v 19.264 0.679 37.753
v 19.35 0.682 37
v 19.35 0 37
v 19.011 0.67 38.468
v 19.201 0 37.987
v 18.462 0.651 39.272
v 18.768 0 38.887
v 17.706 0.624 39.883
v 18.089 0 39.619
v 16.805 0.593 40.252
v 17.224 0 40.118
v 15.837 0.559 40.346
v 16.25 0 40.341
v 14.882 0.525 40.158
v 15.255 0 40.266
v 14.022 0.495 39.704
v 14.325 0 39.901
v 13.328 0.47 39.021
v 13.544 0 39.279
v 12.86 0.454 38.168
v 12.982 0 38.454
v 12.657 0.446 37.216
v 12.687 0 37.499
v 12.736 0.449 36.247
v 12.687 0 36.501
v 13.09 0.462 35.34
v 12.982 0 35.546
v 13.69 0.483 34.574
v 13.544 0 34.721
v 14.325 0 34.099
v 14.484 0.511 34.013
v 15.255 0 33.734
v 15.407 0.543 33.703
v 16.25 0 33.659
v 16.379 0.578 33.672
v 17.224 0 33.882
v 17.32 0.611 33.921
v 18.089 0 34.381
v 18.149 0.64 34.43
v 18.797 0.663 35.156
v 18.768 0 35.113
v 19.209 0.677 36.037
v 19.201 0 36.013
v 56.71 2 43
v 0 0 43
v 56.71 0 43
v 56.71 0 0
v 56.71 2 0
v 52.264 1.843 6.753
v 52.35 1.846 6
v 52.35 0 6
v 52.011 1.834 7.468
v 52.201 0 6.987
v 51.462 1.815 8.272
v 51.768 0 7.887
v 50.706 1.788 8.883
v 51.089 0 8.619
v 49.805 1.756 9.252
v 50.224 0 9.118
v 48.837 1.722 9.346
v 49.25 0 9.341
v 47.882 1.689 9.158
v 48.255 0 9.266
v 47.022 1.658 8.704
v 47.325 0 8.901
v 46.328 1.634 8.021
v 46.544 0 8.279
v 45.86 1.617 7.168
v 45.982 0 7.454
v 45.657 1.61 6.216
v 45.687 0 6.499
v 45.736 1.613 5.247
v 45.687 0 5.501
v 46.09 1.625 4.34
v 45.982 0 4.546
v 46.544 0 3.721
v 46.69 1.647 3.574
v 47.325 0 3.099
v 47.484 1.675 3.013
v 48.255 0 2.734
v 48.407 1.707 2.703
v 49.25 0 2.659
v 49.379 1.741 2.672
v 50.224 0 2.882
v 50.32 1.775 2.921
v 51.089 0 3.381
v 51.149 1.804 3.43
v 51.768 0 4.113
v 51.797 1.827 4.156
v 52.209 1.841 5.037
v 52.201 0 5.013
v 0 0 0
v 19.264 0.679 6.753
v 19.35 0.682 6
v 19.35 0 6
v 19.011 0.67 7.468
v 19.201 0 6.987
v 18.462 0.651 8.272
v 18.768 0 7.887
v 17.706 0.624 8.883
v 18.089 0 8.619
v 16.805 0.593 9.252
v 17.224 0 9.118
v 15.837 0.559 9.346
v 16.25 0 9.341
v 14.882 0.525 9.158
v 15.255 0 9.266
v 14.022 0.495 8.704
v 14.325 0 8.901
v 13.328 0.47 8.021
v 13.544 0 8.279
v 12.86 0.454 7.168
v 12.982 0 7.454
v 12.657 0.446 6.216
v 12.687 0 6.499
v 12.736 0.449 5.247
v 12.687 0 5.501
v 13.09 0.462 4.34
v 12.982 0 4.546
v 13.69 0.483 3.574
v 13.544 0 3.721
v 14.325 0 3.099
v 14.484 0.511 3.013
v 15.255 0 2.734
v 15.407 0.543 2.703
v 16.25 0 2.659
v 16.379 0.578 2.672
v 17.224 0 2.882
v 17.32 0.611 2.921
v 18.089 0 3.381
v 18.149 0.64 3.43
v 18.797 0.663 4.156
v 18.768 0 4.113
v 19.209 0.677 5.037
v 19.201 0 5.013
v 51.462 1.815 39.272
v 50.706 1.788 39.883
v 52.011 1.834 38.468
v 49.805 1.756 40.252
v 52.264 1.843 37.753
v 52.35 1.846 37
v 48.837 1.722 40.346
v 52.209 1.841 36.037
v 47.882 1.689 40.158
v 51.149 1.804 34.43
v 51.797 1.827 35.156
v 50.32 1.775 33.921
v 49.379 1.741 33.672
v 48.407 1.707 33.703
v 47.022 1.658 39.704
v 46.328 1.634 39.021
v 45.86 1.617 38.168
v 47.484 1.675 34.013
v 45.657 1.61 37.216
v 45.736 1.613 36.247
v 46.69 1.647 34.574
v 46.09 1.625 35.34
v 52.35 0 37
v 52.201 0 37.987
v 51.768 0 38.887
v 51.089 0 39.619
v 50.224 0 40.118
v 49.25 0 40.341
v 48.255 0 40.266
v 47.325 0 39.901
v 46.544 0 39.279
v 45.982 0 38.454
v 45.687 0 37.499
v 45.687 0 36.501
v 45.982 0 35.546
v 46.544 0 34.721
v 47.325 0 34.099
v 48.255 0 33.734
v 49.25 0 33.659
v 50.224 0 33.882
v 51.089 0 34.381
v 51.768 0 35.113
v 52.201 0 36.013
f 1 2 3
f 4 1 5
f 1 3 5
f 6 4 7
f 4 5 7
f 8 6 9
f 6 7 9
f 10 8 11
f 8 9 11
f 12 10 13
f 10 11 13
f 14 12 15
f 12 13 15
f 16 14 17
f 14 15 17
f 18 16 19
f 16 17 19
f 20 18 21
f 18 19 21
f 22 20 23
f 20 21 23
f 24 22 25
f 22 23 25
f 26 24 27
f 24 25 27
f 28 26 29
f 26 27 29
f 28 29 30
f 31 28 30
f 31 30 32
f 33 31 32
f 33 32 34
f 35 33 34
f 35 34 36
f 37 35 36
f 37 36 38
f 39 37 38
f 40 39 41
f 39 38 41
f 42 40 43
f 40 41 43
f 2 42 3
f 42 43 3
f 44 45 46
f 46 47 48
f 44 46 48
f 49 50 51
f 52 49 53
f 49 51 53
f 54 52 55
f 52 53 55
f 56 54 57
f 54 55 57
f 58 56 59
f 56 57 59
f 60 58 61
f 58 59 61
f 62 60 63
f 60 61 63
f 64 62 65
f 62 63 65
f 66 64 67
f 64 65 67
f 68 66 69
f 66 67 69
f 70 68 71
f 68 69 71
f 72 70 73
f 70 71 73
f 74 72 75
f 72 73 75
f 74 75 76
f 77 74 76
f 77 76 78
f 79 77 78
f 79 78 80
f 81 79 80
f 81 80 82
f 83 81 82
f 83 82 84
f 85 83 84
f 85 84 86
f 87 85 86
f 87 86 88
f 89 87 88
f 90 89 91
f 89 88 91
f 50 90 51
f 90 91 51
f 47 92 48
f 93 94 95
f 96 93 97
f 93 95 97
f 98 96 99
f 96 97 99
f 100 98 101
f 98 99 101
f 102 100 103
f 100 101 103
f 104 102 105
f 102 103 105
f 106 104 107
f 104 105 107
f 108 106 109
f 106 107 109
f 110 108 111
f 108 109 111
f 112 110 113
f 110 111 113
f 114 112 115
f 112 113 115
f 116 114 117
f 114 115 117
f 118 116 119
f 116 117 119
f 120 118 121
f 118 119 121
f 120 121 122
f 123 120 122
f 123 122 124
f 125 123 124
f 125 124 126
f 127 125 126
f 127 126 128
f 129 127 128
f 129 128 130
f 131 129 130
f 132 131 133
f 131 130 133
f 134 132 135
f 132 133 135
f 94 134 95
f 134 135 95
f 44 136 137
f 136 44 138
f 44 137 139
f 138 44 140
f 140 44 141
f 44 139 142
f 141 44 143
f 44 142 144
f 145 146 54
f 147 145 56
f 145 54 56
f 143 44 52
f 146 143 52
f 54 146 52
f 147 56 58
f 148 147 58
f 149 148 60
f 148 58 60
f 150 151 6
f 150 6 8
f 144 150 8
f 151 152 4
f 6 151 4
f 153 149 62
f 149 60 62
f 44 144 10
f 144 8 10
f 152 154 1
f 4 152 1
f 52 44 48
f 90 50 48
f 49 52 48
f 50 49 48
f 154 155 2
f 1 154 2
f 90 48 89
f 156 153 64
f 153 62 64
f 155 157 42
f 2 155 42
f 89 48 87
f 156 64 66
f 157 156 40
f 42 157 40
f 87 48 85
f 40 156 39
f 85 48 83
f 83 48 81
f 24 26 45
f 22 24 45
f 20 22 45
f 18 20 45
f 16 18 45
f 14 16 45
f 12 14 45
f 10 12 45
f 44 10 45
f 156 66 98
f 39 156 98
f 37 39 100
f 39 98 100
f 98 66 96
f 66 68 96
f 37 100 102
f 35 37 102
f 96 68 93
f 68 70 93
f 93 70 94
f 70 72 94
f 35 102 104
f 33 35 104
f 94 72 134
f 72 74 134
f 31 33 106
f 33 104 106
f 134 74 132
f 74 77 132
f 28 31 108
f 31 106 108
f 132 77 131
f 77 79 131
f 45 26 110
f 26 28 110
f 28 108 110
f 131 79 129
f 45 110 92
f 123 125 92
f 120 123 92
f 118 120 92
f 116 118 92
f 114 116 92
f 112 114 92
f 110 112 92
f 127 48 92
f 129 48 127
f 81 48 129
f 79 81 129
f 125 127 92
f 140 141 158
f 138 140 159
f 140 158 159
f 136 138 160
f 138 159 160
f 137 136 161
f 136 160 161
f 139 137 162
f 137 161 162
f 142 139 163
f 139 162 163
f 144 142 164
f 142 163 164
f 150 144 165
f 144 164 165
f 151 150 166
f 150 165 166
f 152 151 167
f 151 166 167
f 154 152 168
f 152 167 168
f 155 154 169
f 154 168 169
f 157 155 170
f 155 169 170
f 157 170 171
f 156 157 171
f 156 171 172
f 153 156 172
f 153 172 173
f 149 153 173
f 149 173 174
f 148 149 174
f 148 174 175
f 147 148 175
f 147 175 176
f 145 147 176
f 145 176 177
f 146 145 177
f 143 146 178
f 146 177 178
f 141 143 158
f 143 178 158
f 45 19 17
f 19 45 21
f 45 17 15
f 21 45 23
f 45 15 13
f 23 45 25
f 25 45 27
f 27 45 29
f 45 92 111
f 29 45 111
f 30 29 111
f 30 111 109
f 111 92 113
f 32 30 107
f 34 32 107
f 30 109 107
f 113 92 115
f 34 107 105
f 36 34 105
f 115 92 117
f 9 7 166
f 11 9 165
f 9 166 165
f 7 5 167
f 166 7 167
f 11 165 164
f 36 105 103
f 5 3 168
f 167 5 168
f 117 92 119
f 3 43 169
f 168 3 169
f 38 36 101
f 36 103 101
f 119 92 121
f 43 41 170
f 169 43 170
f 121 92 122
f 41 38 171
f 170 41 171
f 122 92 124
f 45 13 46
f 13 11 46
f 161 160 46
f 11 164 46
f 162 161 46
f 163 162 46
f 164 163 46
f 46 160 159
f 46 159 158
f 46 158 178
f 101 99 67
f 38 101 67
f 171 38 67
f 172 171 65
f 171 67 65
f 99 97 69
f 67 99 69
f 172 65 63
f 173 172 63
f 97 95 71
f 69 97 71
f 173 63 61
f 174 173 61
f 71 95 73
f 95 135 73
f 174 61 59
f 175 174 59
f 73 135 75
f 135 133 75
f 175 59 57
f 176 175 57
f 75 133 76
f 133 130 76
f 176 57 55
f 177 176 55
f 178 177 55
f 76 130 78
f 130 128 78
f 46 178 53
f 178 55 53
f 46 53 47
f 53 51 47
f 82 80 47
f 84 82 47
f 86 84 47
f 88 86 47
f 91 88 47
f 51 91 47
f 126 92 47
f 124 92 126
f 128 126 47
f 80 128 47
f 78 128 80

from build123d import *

# Parameters (mm, degrees)
BOSS_EXTRUDE1_DEPTH = 43
CUT_EXTRUDE1_REACH  = 4
SKETCH2_R           = 3.35


with BuildPart() as part:
    # Sketch1 → Boss-Extrude1 (new body)
    with BuildSketch(Plane.XY):
        Polygon((0, 0), (56.71, 0), (56.71, 2), align=None)
    extrude(amount=BOSS_EXTRUDE1_DEPTH)

    # Cut-Extrude1: up to this face of the body (flat: up to its plane)
    cut_extrude1_end = Plane(part.part.faces().sort_by_distance((28.355, 1, 21.5))[0])
    # Sketch2 → Cut-Extrude1 (cut, up to the picked face)
    with BuildSketch(Plane.XZ, mode=Mode.PRIVATE) as cut_extrude1_sk1:
        with Locations((49, 6)):
            Circle(SKETCH2_R)
    cut_extrude1_tool1 = split(extrude(cut_extrude1_sk1.sketch, amount=-CUT_EXTRUDE1_REACH, mode=Mode.PRIVATE), bisect_by=cut_extrude1_end, keep=Keep.BOTH, mode=Mode.PRIVATE)
    add(cut_extrude1_tool1.solids().sort_by_distance((49, 0, 6))[0], mode=Mode.SUBTRACT)
    # Sketch2 → Cut-Extrude1 (cut, up to the picked face)
    with BuildSketch(Plane.XZ, mode=Mode.PRIVATE) as cut_extrude1_sk2:
        with Locations((49, 37)):
            Circle(SKETCH2_R)
    cut_extrude1_tool2 = split(extrude(cut_extrude1_sk2.sketch, amount=-CUT_EXTRUDE1_REACH, mode=Mode.PRIVATE), bisect_by=cut_extrude1_end, keep=Keep.BOTH, mode=Mode.PRIVATE)
    add(cut_extrude1_tool2.solids().sort_by_distance((49, 0, 37))[0], mode=Mode.SUBTRACT)
    # Sketch2 → Cut-Extrude1 (cut, up to the picked face)
    with BuildSketch(Plane.XZ, mode=Mode.PRIVATE) as cut_extrude1_sk3:
        with Locations((16, 37)):
            Circle(SKETCH2_R)
    cut_extrude1_tool3 = split(extrude(cut_extrude1_sk3.sketch, amount=-CUT_EXTRUDE1_REACH, mode=Mode.PRIVATE), bisect_by=cut_extrude1_end, keep=Keep.BOTH, mode=Mode.PRIVATE)
    add(cut_extrude1_tool3.solids().sort_by_distance((16, 0, 37))[0], mode=Mode.SUBTRACT)
    # Sketch2 → Cut-Extrude1 (cut, up to the picked face)
    with BuildSketch(Plane.XZ, mode=Mode.PRIVATE) as cut_extrude1_sk4:
        with Locations((16, 6)):
            Circle(SKETCH2_R)
    cut_extrude1_tool4 = split(extrude(cut_extrude1_sk4.sketch, amount=-CUT_EXTRUDE1_REACH, mode=Mode.PRIVATE), bisect_by=cut_extrude1_end, keep=Keep.BOTH, mode=Mode.PRIVATE)
    add(cut_extrude1_tool4.solids().sort_by_distance((16, 0, 6))[0], mode=Mode.SUBTRACT)


solid = part.part
